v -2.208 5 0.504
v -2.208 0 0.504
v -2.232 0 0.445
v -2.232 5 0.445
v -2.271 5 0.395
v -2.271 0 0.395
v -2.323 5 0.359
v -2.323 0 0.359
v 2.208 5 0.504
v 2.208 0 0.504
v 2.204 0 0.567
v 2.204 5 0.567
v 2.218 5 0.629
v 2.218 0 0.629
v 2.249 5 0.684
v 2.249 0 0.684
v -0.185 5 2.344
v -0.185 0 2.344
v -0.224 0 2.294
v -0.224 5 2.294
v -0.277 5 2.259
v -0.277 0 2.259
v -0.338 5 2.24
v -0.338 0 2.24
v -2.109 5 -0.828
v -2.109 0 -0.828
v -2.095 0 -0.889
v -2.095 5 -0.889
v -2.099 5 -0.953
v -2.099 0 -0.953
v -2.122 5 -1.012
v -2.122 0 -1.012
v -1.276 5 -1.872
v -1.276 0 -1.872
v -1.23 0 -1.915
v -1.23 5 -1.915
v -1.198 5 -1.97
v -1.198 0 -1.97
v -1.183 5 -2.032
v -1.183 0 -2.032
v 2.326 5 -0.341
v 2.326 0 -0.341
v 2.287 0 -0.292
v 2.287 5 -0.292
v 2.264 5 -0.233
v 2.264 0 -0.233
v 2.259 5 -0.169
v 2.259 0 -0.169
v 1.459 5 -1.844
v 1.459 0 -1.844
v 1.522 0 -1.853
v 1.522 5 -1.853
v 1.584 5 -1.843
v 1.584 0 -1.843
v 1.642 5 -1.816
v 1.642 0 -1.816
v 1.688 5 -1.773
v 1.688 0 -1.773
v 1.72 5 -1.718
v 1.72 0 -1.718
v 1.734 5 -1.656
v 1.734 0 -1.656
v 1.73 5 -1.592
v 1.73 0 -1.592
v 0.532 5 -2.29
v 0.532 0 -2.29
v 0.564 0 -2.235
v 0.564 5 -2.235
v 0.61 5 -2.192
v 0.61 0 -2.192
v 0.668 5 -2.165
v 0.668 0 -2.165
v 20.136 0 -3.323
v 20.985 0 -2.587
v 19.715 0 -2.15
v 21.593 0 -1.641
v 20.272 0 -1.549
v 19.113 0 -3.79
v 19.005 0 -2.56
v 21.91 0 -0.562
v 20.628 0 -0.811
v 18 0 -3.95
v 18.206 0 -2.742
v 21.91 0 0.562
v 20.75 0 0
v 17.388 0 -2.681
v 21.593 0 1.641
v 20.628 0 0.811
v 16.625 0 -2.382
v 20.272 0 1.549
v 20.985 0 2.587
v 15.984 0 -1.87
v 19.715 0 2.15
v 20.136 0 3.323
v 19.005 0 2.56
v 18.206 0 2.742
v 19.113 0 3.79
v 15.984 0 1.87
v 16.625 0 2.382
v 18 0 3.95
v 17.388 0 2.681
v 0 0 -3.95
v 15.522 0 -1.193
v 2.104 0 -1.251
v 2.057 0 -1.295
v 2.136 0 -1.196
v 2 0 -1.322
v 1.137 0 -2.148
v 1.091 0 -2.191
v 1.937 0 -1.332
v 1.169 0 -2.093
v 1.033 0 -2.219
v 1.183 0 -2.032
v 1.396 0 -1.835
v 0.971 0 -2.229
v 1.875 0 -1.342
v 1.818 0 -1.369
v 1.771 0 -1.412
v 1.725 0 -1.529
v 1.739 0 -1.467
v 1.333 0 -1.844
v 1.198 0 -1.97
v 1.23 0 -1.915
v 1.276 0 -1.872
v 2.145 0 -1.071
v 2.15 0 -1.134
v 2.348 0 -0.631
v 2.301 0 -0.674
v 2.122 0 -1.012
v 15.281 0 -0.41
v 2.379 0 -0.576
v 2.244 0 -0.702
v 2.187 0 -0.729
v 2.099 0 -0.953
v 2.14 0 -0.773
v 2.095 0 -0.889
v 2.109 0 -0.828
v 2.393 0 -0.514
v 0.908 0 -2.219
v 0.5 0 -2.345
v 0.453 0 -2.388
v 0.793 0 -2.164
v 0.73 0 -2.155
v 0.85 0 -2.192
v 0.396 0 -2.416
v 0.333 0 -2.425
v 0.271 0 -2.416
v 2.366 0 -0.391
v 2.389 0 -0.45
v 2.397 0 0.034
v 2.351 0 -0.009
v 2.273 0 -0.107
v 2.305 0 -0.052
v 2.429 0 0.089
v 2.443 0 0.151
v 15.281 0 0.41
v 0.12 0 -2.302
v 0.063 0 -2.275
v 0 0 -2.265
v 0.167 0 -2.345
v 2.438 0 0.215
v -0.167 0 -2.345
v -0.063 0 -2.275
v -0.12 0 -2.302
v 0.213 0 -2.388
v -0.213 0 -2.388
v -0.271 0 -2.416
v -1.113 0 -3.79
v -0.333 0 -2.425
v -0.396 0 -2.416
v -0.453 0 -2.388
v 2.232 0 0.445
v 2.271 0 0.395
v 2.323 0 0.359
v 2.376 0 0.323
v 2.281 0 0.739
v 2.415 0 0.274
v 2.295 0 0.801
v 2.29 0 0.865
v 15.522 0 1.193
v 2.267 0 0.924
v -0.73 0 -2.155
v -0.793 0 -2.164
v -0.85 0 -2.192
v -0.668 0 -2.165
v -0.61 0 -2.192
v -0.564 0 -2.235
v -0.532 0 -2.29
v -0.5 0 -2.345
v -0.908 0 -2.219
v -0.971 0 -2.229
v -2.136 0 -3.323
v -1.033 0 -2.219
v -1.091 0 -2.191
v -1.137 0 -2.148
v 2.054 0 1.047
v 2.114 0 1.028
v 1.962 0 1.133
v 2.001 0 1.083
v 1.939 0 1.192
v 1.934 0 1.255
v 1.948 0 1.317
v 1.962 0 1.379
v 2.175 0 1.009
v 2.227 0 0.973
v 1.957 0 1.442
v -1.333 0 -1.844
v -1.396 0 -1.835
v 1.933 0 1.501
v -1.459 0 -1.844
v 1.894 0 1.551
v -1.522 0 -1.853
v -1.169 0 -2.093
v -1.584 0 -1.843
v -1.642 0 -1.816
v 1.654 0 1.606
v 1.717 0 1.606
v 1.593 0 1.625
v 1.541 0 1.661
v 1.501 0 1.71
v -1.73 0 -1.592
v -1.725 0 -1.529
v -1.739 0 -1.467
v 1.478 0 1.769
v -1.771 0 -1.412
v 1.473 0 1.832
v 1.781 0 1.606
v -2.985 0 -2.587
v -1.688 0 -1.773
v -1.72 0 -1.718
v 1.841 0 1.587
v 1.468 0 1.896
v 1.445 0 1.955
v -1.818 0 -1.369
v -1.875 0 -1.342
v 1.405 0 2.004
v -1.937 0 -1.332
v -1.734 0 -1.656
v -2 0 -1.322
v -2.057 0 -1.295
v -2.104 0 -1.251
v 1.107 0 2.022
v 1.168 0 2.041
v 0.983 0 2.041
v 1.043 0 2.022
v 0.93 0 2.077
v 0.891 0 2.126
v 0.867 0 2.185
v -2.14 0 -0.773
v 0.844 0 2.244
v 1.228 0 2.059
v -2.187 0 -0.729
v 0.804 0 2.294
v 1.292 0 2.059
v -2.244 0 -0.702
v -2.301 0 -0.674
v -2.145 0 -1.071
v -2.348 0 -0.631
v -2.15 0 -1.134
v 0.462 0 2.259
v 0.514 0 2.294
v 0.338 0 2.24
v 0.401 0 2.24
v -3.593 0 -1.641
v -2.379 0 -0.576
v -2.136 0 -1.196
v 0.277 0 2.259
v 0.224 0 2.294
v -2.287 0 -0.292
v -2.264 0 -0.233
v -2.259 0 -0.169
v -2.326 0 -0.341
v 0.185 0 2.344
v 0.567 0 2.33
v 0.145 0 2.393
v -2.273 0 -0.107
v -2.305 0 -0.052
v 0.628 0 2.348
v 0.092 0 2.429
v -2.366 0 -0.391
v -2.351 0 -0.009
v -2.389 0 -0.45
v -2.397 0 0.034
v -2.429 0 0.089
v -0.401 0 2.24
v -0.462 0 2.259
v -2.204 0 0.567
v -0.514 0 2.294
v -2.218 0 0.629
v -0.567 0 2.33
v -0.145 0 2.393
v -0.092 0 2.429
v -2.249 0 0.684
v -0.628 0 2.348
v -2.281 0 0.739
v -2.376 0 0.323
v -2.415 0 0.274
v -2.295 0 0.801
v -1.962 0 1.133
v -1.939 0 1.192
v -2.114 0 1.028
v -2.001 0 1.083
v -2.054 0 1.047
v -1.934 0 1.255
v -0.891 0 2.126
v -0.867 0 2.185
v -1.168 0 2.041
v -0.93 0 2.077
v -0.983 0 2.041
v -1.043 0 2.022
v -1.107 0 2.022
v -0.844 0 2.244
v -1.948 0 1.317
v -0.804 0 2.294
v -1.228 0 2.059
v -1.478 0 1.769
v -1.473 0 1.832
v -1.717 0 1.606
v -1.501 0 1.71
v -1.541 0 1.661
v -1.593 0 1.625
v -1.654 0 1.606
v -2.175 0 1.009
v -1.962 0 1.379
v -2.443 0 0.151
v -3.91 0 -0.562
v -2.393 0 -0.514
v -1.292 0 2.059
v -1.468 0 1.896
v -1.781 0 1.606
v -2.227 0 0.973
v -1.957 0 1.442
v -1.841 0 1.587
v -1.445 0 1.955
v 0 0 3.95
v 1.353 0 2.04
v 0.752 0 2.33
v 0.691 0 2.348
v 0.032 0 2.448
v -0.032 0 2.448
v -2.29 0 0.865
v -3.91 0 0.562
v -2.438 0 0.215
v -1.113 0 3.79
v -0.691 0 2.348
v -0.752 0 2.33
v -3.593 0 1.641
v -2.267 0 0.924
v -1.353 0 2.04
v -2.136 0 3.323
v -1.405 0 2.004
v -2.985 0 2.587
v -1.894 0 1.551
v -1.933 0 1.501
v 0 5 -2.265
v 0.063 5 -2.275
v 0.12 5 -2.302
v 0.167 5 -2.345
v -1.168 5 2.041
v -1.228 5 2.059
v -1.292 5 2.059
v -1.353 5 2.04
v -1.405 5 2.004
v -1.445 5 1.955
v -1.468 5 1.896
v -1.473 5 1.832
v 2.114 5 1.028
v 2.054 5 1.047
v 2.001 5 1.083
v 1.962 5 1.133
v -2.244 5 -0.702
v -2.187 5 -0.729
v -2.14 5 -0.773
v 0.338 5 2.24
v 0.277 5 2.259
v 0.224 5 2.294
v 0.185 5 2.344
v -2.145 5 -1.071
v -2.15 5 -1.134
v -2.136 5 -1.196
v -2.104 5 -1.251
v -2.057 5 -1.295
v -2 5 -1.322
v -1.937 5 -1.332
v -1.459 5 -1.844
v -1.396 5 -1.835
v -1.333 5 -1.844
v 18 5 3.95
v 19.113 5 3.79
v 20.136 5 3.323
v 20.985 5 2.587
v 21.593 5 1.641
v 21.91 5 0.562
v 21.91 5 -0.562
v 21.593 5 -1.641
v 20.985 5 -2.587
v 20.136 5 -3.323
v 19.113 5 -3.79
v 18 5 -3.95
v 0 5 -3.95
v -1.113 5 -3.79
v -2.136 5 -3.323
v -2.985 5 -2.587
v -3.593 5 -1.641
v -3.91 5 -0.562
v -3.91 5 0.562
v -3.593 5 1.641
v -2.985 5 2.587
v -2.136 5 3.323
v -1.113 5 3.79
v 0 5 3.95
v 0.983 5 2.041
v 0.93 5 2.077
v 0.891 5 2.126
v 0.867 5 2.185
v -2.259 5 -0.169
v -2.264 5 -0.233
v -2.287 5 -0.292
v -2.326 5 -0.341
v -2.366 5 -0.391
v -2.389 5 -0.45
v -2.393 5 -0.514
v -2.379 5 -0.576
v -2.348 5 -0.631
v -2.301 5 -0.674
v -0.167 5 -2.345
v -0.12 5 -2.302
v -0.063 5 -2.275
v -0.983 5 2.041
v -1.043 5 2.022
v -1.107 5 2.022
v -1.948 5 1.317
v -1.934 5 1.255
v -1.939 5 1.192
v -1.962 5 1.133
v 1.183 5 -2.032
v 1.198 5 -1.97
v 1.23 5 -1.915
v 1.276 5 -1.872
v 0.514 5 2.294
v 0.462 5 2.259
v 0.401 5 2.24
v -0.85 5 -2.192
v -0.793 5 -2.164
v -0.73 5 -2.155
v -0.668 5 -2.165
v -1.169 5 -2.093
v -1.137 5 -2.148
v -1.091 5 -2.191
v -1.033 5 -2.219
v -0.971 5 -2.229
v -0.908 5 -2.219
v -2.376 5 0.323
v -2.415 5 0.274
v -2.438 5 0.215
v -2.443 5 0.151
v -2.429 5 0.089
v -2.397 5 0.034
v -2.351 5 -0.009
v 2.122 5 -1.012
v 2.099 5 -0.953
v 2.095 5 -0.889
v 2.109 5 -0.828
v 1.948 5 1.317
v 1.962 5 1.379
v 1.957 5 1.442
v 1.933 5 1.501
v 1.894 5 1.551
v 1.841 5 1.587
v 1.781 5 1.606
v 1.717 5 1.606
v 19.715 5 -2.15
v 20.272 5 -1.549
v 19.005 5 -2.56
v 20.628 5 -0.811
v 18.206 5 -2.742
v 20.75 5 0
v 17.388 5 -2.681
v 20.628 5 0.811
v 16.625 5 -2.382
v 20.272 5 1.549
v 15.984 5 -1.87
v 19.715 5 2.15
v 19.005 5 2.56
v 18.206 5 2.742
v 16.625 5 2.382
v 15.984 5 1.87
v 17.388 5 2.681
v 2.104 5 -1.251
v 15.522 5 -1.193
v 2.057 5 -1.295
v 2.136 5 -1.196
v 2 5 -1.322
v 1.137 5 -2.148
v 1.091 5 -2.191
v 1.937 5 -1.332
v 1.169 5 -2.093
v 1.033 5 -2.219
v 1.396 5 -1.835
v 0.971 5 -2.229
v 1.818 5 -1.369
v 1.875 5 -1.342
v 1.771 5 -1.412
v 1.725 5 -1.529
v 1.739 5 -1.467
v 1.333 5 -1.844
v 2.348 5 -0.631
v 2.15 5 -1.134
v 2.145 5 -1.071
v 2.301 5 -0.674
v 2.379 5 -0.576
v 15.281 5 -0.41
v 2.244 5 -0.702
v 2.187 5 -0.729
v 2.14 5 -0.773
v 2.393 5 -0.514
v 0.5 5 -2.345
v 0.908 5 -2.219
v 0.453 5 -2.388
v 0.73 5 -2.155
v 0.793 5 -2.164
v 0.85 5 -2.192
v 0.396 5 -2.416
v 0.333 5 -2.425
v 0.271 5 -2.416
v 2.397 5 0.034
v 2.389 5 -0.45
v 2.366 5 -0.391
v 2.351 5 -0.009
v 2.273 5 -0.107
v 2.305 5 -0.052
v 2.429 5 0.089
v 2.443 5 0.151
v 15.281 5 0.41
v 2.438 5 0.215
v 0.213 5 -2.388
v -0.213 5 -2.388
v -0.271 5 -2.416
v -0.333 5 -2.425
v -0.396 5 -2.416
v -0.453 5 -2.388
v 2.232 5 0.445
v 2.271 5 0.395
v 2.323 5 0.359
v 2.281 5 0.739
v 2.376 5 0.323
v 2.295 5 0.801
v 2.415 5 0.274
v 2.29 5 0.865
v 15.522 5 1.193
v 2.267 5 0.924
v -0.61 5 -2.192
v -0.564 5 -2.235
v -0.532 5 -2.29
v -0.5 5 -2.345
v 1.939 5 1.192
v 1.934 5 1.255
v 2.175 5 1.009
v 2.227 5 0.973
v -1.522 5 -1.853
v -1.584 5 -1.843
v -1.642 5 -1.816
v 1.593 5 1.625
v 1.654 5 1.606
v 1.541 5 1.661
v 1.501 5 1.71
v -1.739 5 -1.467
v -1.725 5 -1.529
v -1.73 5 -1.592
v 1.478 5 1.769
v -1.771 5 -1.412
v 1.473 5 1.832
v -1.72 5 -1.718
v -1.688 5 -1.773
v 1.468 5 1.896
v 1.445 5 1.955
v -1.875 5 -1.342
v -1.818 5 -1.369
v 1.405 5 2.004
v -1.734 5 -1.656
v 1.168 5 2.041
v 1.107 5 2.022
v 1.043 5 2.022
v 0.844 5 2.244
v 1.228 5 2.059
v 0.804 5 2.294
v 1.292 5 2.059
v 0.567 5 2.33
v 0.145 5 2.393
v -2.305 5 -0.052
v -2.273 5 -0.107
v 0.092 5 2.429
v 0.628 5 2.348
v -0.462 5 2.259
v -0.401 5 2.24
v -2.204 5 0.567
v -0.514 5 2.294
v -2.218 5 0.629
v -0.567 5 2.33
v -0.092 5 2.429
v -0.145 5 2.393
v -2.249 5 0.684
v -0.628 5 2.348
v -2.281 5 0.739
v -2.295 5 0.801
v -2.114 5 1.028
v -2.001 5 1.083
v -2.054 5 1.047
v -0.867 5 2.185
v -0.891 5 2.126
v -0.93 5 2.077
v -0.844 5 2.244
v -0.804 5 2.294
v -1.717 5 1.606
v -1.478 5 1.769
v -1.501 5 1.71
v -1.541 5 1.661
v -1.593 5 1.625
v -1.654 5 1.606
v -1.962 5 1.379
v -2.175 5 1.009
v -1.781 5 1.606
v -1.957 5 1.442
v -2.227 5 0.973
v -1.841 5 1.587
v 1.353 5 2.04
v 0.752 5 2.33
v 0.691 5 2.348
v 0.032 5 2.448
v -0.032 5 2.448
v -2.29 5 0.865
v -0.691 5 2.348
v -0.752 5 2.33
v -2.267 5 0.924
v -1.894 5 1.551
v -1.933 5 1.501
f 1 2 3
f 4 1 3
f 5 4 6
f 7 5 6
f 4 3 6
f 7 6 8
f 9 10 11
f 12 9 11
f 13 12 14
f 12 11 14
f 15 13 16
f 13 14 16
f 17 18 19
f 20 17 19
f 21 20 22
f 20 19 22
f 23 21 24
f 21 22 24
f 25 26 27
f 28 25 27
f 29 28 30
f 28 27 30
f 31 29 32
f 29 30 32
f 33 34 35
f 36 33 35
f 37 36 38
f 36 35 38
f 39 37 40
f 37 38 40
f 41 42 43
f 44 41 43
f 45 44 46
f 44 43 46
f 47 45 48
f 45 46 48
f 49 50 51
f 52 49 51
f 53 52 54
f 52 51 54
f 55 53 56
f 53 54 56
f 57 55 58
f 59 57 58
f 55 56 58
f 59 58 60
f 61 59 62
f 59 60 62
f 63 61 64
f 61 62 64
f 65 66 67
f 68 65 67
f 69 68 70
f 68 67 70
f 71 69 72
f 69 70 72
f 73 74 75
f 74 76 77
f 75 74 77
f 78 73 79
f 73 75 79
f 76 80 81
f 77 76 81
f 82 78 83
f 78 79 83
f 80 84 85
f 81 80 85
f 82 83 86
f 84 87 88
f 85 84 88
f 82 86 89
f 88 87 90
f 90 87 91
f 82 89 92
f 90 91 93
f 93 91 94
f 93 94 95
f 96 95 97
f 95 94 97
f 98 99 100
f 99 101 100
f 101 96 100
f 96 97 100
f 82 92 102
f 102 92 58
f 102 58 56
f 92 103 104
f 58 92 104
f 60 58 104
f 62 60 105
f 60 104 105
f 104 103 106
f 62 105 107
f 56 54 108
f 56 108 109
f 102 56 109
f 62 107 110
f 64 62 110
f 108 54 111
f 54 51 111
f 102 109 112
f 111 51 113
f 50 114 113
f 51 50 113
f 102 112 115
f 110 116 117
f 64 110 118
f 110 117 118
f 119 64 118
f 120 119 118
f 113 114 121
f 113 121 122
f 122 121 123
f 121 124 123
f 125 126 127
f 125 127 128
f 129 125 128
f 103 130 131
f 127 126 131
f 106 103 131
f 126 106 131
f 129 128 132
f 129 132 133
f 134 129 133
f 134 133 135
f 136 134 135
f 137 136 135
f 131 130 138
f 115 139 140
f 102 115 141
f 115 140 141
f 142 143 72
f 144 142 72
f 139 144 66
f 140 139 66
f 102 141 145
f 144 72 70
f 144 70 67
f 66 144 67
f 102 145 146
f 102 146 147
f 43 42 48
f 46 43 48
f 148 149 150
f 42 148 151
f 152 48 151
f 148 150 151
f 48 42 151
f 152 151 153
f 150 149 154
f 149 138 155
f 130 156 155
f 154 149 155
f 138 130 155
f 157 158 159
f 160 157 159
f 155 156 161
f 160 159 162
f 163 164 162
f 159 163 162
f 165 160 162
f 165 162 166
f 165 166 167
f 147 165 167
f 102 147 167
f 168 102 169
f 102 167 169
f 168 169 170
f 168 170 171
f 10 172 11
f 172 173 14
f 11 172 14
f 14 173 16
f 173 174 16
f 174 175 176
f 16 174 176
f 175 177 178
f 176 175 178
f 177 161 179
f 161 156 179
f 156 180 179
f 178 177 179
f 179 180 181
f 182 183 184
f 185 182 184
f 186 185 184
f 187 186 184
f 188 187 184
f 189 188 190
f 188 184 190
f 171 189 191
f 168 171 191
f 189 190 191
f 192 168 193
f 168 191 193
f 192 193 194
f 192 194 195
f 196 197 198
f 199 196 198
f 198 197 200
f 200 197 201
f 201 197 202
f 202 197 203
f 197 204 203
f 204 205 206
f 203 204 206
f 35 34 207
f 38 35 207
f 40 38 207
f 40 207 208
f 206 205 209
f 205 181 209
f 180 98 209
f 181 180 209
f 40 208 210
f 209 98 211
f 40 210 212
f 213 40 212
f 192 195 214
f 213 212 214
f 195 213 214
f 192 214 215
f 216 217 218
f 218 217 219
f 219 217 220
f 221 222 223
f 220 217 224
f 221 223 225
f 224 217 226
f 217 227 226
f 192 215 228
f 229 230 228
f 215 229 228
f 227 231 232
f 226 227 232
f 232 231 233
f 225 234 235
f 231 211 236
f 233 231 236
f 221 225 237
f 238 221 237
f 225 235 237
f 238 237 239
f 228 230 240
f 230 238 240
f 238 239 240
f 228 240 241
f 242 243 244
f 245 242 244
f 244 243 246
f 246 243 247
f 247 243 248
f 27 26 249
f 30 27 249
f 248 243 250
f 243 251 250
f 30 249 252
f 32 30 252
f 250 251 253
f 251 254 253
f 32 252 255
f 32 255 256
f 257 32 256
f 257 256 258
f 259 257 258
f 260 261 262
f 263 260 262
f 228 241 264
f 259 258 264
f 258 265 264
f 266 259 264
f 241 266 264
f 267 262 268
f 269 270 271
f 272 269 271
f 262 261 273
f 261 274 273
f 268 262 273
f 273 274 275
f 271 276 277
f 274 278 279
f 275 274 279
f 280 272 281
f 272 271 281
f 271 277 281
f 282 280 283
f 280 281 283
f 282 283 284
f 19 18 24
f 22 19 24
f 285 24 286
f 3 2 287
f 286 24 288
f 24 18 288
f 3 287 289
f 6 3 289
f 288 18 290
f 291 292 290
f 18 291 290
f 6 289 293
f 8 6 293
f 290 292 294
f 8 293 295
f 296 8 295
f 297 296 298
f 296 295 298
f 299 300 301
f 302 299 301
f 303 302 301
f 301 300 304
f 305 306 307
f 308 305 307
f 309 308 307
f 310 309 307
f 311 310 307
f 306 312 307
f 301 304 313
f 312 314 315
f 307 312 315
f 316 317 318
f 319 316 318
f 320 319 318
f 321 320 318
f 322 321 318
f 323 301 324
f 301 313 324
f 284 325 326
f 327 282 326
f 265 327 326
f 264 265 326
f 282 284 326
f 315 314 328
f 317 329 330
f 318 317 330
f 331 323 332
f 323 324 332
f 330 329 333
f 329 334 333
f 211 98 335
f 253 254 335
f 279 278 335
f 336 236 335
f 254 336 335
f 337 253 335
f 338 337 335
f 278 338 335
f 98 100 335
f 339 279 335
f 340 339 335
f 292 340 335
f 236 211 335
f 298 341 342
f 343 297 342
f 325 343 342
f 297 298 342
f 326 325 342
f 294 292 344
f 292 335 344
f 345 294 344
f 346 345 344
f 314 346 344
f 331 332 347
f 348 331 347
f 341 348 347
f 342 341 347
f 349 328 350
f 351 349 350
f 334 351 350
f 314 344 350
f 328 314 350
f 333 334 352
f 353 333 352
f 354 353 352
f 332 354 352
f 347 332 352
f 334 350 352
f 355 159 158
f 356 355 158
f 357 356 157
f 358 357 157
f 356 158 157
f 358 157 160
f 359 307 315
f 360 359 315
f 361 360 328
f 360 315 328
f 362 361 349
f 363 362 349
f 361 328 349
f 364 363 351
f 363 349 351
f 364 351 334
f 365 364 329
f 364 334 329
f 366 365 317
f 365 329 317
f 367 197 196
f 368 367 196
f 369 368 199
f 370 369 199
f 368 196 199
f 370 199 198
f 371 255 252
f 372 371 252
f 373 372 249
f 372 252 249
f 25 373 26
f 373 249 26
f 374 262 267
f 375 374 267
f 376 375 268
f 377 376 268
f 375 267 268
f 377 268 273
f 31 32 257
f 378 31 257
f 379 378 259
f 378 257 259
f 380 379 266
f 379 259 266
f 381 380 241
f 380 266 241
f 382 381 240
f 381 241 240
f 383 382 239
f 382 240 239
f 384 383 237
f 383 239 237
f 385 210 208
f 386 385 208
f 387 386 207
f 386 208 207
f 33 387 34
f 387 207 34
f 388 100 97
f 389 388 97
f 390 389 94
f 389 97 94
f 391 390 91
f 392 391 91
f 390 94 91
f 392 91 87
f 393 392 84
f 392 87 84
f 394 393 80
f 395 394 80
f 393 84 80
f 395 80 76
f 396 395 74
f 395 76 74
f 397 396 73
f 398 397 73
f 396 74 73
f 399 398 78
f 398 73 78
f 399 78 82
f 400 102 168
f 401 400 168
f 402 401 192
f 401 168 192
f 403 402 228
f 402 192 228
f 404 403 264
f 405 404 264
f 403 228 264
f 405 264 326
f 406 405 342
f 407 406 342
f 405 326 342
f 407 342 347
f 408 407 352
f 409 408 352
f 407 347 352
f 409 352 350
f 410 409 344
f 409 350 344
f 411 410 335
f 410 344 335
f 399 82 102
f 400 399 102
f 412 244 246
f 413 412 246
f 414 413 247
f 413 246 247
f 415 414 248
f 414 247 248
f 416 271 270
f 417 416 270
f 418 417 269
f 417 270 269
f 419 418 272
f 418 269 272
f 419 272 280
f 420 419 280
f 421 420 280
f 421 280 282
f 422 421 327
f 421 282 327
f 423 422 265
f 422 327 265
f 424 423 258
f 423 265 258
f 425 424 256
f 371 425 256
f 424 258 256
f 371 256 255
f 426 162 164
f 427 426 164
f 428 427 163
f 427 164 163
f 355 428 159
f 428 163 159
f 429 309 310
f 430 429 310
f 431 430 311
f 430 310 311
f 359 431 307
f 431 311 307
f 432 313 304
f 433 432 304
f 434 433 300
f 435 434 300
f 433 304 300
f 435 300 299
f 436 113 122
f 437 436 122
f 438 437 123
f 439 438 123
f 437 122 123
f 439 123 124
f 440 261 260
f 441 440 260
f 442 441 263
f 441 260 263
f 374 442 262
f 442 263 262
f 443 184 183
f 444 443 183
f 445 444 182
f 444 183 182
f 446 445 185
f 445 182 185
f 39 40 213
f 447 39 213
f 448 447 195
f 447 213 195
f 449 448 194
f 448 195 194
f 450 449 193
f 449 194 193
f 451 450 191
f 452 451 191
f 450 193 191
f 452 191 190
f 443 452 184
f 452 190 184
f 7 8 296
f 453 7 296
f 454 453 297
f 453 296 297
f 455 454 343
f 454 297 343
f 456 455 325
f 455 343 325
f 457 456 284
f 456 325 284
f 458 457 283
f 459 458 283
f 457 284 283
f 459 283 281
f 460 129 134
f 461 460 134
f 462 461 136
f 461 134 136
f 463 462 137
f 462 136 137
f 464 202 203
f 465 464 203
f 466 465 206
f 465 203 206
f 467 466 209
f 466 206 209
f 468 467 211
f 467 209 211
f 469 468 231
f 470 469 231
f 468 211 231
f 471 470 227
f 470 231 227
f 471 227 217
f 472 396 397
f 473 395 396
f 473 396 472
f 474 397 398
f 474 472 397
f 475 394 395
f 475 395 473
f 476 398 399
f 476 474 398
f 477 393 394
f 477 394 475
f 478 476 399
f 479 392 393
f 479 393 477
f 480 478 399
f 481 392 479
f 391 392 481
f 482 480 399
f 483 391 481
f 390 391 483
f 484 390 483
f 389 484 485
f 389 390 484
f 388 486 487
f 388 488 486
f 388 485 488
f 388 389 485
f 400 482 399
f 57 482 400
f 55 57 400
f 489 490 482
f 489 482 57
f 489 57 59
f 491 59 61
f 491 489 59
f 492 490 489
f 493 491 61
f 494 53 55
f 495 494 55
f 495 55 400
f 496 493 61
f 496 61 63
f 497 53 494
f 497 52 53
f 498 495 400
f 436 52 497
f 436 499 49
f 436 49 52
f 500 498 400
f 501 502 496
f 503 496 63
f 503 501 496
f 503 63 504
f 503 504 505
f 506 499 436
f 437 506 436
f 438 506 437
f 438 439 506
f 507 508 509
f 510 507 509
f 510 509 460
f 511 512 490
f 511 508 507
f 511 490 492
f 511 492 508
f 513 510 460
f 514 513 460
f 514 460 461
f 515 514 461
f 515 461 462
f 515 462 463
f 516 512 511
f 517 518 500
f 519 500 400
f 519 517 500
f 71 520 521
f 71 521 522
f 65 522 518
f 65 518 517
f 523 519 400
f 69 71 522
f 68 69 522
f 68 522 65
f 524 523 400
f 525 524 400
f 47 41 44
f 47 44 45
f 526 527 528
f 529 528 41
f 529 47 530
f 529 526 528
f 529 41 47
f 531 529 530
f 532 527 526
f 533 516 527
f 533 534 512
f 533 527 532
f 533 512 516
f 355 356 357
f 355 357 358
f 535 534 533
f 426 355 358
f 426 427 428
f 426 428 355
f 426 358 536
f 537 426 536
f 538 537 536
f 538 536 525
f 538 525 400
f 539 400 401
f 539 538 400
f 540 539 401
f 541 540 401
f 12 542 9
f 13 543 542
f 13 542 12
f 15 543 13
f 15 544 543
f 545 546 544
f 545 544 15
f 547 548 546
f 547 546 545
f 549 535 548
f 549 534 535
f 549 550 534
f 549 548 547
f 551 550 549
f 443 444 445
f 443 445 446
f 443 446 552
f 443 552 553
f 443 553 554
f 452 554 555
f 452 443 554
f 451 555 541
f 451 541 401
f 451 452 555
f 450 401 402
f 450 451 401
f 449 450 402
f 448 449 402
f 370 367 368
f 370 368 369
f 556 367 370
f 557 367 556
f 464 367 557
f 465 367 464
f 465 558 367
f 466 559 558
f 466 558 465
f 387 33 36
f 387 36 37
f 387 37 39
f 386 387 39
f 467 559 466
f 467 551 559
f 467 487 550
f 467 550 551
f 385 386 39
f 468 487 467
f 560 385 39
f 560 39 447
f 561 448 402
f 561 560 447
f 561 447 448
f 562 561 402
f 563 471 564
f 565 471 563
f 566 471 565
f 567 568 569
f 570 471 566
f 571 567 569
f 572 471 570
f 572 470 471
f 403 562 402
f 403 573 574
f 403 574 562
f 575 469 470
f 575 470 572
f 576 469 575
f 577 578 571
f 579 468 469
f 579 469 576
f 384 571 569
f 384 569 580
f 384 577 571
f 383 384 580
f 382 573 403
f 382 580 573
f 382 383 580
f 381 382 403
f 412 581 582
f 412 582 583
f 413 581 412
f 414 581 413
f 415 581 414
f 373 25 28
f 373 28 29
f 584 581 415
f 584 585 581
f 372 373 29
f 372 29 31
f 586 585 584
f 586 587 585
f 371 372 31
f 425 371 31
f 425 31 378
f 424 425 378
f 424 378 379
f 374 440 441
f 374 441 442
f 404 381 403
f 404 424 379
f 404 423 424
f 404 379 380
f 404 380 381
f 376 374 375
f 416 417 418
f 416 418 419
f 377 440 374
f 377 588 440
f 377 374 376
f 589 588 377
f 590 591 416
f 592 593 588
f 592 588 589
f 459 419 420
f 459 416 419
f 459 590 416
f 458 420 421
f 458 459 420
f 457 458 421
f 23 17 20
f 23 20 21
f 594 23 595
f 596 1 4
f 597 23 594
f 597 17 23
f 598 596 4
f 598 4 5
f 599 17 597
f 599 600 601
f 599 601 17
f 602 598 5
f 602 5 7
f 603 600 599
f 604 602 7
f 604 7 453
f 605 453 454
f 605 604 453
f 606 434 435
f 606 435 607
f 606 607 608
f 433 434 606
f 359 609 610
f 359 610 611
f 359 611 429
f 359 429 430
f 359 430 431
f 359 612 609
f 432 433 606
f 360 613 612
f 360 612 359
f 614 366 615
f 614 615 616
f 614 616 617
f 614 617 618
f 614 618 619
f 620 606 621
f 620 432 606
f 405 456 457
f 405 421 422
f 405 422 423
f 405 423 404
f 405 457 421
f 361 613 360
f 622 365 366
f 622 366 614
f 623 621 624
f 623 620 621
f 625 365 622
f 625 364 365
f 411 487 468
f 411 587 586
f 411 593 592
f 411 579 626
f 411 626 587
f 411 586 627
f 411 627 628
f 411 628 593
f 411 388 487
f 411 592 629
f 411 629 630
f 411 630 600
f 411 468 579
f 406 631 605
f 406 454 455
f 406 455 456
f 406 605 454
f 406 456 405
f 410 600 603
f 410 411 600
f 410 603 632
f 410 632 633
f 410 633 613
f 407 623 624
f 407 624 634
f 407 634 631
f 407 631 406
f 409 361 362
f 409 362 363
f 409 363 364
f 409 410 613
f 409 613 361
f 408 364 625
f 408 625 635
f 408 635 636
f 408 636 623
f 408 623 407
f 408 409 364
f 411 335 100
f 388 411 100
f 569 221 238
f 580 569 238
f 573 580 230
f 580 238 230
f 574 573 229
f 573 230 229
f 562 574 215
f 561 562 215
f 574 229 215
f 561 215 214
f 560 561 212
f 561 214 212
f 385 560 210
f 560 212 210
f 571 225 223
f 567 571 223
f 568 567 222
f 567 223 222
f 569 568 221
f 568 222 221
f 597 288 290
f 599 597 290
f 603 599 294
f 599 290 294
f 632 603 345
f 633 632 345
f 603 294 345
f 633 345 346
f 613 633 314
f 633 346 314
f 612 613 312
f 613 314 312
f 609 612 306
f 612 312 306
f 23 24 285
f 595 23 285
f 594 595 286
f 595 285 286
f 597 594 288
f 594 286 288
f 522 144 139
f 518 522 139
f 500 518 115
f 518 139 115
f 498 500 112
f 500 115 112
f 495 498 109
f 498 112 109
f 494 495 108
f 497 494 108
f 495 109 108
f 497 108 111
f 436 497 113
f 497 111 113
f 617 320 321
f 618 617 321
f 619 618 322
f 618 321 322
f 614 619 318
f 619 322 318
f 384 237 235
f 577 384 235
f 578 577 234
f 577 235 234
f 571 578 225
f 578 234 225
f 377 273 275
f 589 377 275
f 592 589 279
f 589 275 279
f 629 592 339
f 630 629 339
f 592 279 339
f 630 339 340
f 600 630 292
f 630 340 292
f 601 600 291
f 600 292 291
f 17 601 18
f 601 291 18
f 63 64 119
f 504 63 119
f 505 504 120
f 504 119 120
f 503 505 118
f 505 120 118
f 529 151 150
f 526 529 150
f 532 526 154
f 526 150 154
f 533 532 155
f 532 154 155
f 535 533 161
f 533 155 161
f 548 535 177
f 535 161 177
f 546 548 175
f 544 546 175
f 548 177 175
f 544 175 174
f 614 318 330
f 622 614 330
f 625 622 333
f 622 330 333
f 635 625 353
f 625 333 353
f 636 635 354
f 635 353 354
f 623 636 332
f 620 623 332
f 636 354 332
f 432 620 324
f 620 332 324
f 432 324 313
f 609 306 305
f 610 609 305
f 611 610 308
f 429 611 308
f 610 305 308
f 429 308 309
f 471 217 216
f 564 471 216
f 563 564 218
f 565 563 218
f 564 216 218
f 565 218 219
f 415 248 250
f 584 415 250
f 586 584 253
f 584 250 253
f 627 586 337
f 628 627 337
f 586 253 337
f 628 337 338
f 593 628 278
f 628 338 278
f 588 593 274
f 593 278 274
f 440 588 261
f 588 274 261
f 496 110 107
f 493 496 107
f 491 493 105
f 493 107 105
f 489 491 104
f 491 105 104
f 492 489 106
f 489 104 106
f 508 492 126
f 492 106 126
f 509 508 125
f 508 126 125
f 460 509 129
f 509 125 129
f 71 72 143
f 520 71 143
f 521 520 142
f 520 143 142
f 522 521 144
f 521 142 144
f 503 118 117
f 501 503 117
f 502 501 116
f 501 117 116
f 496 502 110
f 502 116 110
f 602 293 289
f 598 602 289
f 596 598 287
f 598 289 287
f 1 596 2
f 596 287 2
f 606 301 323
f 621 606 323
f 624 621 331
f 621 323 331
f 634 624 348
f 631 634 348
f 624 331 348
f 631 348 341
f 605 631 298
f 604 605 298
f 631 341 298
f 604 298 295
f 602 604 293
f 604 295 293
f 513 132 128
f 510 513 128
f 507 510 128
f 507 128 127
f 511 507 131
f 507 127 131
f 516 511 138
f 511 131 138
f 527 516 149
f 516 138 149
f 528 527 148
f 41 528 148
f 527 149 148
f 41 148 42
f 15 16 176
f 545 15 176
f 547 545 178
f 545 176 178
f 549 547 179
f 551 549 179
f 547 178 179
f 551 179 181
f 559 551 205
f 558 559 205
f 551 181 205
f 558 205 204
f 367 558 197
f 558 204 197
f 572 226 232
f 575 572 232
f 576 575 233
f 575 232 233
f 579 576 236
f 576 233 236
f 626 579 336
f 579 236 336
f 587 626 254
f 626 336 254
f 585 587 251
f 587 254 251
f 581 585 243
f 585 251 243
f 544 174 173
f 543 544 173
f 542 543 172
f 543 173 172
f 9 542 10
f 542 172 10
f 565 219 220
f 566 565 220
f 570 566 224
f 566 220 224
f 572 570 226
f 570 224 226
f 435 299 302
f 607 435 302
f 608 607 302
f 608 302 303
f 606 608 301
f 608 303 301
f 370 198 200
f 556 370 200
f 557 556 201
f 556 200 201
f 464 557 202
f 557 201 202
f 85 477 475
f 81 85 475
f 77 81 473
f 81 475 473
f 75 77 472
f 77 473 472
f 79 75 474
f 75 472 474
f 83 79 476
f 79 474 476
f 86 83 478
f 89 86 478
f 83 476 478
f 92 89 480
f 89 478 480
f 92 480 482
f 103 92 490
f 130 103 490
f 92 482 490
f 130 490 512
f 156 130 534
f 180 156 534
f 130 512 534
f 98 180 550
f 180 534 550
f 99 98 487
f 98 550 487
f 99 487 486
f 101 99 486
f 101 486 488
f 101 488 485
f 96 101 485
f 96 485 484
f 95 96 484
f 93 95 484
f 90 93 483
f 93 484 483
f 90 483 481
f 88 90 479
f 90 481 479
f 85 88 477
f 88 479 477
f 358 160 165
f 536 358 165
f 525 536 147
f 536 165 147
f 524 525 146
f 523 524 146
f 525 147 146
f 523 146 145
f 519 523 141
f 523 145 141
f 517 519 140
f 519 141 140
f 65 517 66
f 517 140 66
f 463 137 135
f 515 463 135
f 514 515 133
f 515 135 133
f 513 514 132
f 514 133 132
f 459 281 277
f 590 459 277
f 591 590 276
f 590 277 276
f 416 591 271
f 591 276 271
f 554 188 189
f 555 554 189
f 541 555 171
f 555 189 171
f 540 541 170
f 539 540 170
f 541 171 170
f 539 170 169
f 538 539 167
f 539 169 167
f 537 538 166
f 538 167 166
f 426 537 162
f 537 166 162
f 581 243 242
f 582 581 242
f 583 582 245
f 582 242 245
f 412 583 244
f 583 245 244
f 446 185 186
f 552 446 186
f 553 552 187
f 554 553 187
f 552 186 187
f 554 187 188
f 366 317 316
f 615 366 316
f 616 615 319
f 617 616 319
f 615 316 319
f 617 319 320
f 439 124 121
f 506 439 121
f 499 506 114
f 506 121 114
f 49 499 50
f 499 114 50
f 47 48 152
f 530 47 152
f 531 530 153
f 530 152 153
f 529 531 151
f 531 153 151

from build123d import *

# Parameters (mm, degrees)
SKETCH1_R           = 3.95
BOSS_EXTRUDE1_DEPTH = 5
BOSS_EXTRUDE2_DEPTH = 5
SKETCH3_R           = 2.75
CUT_EXTRUDE1_DEPTH  = 5


with BuildPart() as part:
    # Sketch1 → Boss-Extrude1 (new body)
    with BuildSketch(Plane(origin=(0, 0, 0), x_dir=(1, 0, 0), z_dir=(0, 1, 0))):
        Circle(SKETCH1_R)
        with BuildLine():
            ThreePointArc((-0.166646614, 2.345141313), (-0.092401566, 2.286261662), (0, 2.2652595))
            ThreePointArc((0, 2.2652595), (0.092401566, 2.286261662), (0.166646614, 2.345141313))
            ThreePointArc((0.166646614, 2.345141313), (0.365153552, 2.422635524), (0.531999564, 2.290073216))
            ThreePointArc((0.531999564, 2.290073216), (0.585591031, 2.211925311), (0.667696959, 2.164620376))
            ThreePointArc((0.667696959, 2.164620376), (0.762183879, 2.157453631), (0.850485509, 2.191833312))
            ThreePointArc((0.850485509, 2.191833312), (1.063015161, 2.207373726), (1.183375246, 2.031522064))
            ThreePointArc((1.183375246, 2.031522064), (1.211551295, 1.941049689), (1.276066113, 1.871645232))
            ThreePointArc((1.276066113, 1.871645232), (1.364242809, 1.836946378), (1.458755034, 1.843771303))
            ThreePointArc((1.458755034, 1.843771303), (1.666423208, 1.795977086), (1.729602845, 1.592461261))
            ThreePointArc((1.729602845, 1.592461261), (1.72985991, 1.497703284), (1.771051193, 1.412366197))
            ThreePointArc((1.771051193, 1.412366197), (1.845082779, 1.353218377), (1.937407773, 1.331882123))
            ThreePointArc((1.937407773, 1.331882123), (2.121762239, 1.225), (2.12214764, 1.011903287))
            ThreePointArc((2.12214764, 1.011903287), (2.094462881, 0.92127937), (2.108670602, 0.827592226))
            ThreePointArc((2.108670602, 0.827592226), (2.161979047, 0.749250985), (2.243913329, 0.701649371))
            ThreePointArc((2.243913329, 0.701649371), (2.388573385, 0.545176288), (2.326130305, 0.341433266))
            ThreePointArc((2.326130305, 0.341433266), (2.272963633, 0.262995741), (2.258925375, 0.169283054))
            ThreePointArc((2.258925375, 0.169283054), (2.286773988, 0.078709355), (2.351037339, 0.009071994))
            ThreePointArc((2.351037339, 0.009071994), (2.443149303, -0.183088729), (2.323426084, -0.3593746))
            ThreePointArc((2.323426084, -0.3593746), (2.249501592, -0.418656214), (2.208464714, -0.504067659))
            ThreePointArc((2.208464714, -0.504067659), (2.208379026, -0.598825947), (2.249261363, -0.68431147))
            ThreePointArc((2.249261363, -0.68431147), (2.280640684, -0.89508551), (2.114275259, -1.028250455))
            ThreePointArc((2.114275259, -1.028250455), (2.026161462, -1.063108727), (1.961772273, -1.13262975))
            ThreePointArc((1.961772273, -1.13262975), (1.933759896, -1.223152935), (1.947628645, -1.316890857))
            ThreePointArc((1.947628645, -1.316890857), (1.915487132, -1.527550015), (1.717261799, -1.605761745))
            ThreePointArc((1.717261799, -1.605761745), (1.622787995, -1.613099364), (1.540767756, -1.660552716))
            ThreePointArc((1.540767756, -1.660552716), (1.487317713, -1.738797417), (1.472940575, -1.832458712))
            ThreePointArc((1.472940575, -1.832458712), (1.380134142, -2.024284997), (1.167662092, -2.040594058))
            ThreePointArc((1.167662092, -2.040594058), (1.075222693, -2.019759044), (0.982859262, -2.040928287))
            ThreePointArc((0.982859262, -2.040928287), (0.908720824, -2.099942118), (0.86737527, -2.185204569))
            ThreePointArc((0.86737527, -2.185204569), (0.722150177, -2.341153374), (0.514310485, -2.294110633))
            ThreePointArc((0.514310485, -2.294110633), (0.432119136, -2.246954269), (0.337619409, -2.239958423))
            ThreePointArc((0.337619409, -2.239958423), (0.249380102, -2.274497747), (0.184739867, -2.343785411))
            ThreePointArc((0.184739867, -2.343785411), (0, -2.45), (-0.184739867, -2.343785411))
            ThreePointArc((-0.184739867, -2.343785411), (-0.249380102, -2.274497747), (-0.337619409, -2.239958423))
            ThreePointArc((-0.337619409, -2.239958423), (-0.432119136, -2.246954269), (-0.514310485, -2.294110633))
            ThreePointArc((-0.514310485, -2.294110633), (-0.722150177, -2.341153374), (-0.86737527, -2.185204569))
            ThreePointArc((-0.86737527, -2.185204569), (-0.908720824, -2.099942118), (-0.982859262, -2.040928287))
            ThreePointArc((-0.982859262, -2.040928287), (-1.075222693, -2.019759044), (-1.167662092, -2.040594058))
            ThreePointArc((-1.167662092, -2.040594058), (-1.380134142, -2.024284997), (-1.472940575, -1.832458712))
            ThreePointArc((-1.472940575, -1.832458712), (-1.487317713, -1.738797417), (-1.540767756, -1.660552716))
            ThreePointArc((-1.540767756, -1.660552716), (-1.622787995, -1.613099364), (-1.717261799, -1.605761745))
            ThreePointArc((-1.717261799, -1.605761745), (-1.915487132, -1.527550015), (-1.947628645, -1.316890857))
            ThreePointArc((-1.947628645, -1.316890857), (-1.933759896, -1.223152935), (-1.961772273, -1.13262975))
            ThreePointArc((-1.961772273, -1.13262975), (-2.026161462, -1.063108727), (-2.114275259, -1.028250455))
            ThreePointArc((-2.114275259, -1.028250455), (-2.280640684, -0.89508551), (-2.249261363, -0.68431147))
            ThreePointArc((-2.249261363, -0.68431147), (-2.208379026, -0.598825947), (-2.208464714, -0.504067659))
            ThreePointArc((-2.208464714, -0.504067659), (-2.249501592, -0.418656214), (-2.323426084, -0.3593746))
            ThreePointArc((-2.323426084, -0.3593746), (-2.443149303, -0.183088729), (-2.351037339, 0.009071994))
            ThreePointArc((-2.351037339, 0.009071994), (-2.286773988, 0.078709355), (-2.258925375, 0.169283054))
            ThreePointArc((-2.258925375, 0.169283054), (-2.272963633, 0.262995741), (-2.326130305, 0.341433266))
            ThreePointArc((-2.326130305, 0.341433266), (-2.388573385, 0.545176288), (-2.243913329, 0.701649371))
            ThreePointArc((-2.243913329, 0.701649371), (-2.161979047, 0.749250985), (-2.108670602, 0.827592226))
            ThreePointArc((-2.108670602, 0.827592226), (-2.094462881, 0.92127937), (-2.12214764, 1.011903287))
            ThreePointArc((-2.12214764, 1.011903287), (-2.121762239, 1.225), (-1.937407773, 1.331882123))
            ThreePointArc((-1.937407773, 1.331882123), (-1.845082779, 1.353218377), (-1.771051193, 1.412366197))
            ThreePointArc((-1.771051193, 1.412366197), (-1.72985991, 1.497703284), (-1.729602845, 1.592461261))
            ThreePointArc((-1.729602845, 1.592461261), (-1.666423208, 1.795977086), (-1.458755034, 1.843771303))
            ThreePointArc((-1.458755034, 1.843771303), (-1.364242809, 1.836946378), (-1.276066113, 1.871645232))
            ThreePointArc((-1.276066113, 1.871645232), (-1.211551295, 1.941049689), (-1.183375246, 2.031522064))
            ThreePointArc((-1.183375246, 2.031522064), (-1.063015161, 2.207373726), (-0.850485509, 2.191833312))
            ThreePointArc((-0.850485509, 2.191833312), (-0.762183879, 2.157453631), (-0.667696959, 2.164620376))
            ThreePointArc((-0.667696959, 2.164620376), (-0.585591031, 2.211925311), (-0.531999564, 2.290073216))
            ThreePointArc((-0.531999564, 2.290073216), (-0.365153552, 2.422635524), (-0.166646614, 2.345141313))
        make_face(mode=Mode.SUBTRACT)
    extrude(amount=BOSS_EXTRUDE1_DEPTH)

    # Sketch2 → Boss-Extrude2 (add)
    with BuildSketch(Plane.XZ):
        with BuildLine():
            Line((0, 3.95), (18, 3.95))
            ThreePointArc((18, 3.95), (21.95, 0), (18, -3.95))
            Line((18, -3.95), (0, -3.95))
            ThreePointArc((0, -3.95), (3.95, 0), (0, 3.95))
        make_face()
    extrude(amount=-BOSS_EXTRUDE2_DEPTH)

    # Sketch3 → Cut-Extrude1 (cut)
    with BuildSketch(Plane(origin=(0, 5, 0), x_dir=(1, 0, 0), z_dir=(0, 1, 0))):
        with Locations((18, 0)):
            Circle(SKETCH3_R)
    extrude(amount=-CUT_EXTRUDE1_DEPTH, mode=Mode.SUBTRACT)


solid = part.part
